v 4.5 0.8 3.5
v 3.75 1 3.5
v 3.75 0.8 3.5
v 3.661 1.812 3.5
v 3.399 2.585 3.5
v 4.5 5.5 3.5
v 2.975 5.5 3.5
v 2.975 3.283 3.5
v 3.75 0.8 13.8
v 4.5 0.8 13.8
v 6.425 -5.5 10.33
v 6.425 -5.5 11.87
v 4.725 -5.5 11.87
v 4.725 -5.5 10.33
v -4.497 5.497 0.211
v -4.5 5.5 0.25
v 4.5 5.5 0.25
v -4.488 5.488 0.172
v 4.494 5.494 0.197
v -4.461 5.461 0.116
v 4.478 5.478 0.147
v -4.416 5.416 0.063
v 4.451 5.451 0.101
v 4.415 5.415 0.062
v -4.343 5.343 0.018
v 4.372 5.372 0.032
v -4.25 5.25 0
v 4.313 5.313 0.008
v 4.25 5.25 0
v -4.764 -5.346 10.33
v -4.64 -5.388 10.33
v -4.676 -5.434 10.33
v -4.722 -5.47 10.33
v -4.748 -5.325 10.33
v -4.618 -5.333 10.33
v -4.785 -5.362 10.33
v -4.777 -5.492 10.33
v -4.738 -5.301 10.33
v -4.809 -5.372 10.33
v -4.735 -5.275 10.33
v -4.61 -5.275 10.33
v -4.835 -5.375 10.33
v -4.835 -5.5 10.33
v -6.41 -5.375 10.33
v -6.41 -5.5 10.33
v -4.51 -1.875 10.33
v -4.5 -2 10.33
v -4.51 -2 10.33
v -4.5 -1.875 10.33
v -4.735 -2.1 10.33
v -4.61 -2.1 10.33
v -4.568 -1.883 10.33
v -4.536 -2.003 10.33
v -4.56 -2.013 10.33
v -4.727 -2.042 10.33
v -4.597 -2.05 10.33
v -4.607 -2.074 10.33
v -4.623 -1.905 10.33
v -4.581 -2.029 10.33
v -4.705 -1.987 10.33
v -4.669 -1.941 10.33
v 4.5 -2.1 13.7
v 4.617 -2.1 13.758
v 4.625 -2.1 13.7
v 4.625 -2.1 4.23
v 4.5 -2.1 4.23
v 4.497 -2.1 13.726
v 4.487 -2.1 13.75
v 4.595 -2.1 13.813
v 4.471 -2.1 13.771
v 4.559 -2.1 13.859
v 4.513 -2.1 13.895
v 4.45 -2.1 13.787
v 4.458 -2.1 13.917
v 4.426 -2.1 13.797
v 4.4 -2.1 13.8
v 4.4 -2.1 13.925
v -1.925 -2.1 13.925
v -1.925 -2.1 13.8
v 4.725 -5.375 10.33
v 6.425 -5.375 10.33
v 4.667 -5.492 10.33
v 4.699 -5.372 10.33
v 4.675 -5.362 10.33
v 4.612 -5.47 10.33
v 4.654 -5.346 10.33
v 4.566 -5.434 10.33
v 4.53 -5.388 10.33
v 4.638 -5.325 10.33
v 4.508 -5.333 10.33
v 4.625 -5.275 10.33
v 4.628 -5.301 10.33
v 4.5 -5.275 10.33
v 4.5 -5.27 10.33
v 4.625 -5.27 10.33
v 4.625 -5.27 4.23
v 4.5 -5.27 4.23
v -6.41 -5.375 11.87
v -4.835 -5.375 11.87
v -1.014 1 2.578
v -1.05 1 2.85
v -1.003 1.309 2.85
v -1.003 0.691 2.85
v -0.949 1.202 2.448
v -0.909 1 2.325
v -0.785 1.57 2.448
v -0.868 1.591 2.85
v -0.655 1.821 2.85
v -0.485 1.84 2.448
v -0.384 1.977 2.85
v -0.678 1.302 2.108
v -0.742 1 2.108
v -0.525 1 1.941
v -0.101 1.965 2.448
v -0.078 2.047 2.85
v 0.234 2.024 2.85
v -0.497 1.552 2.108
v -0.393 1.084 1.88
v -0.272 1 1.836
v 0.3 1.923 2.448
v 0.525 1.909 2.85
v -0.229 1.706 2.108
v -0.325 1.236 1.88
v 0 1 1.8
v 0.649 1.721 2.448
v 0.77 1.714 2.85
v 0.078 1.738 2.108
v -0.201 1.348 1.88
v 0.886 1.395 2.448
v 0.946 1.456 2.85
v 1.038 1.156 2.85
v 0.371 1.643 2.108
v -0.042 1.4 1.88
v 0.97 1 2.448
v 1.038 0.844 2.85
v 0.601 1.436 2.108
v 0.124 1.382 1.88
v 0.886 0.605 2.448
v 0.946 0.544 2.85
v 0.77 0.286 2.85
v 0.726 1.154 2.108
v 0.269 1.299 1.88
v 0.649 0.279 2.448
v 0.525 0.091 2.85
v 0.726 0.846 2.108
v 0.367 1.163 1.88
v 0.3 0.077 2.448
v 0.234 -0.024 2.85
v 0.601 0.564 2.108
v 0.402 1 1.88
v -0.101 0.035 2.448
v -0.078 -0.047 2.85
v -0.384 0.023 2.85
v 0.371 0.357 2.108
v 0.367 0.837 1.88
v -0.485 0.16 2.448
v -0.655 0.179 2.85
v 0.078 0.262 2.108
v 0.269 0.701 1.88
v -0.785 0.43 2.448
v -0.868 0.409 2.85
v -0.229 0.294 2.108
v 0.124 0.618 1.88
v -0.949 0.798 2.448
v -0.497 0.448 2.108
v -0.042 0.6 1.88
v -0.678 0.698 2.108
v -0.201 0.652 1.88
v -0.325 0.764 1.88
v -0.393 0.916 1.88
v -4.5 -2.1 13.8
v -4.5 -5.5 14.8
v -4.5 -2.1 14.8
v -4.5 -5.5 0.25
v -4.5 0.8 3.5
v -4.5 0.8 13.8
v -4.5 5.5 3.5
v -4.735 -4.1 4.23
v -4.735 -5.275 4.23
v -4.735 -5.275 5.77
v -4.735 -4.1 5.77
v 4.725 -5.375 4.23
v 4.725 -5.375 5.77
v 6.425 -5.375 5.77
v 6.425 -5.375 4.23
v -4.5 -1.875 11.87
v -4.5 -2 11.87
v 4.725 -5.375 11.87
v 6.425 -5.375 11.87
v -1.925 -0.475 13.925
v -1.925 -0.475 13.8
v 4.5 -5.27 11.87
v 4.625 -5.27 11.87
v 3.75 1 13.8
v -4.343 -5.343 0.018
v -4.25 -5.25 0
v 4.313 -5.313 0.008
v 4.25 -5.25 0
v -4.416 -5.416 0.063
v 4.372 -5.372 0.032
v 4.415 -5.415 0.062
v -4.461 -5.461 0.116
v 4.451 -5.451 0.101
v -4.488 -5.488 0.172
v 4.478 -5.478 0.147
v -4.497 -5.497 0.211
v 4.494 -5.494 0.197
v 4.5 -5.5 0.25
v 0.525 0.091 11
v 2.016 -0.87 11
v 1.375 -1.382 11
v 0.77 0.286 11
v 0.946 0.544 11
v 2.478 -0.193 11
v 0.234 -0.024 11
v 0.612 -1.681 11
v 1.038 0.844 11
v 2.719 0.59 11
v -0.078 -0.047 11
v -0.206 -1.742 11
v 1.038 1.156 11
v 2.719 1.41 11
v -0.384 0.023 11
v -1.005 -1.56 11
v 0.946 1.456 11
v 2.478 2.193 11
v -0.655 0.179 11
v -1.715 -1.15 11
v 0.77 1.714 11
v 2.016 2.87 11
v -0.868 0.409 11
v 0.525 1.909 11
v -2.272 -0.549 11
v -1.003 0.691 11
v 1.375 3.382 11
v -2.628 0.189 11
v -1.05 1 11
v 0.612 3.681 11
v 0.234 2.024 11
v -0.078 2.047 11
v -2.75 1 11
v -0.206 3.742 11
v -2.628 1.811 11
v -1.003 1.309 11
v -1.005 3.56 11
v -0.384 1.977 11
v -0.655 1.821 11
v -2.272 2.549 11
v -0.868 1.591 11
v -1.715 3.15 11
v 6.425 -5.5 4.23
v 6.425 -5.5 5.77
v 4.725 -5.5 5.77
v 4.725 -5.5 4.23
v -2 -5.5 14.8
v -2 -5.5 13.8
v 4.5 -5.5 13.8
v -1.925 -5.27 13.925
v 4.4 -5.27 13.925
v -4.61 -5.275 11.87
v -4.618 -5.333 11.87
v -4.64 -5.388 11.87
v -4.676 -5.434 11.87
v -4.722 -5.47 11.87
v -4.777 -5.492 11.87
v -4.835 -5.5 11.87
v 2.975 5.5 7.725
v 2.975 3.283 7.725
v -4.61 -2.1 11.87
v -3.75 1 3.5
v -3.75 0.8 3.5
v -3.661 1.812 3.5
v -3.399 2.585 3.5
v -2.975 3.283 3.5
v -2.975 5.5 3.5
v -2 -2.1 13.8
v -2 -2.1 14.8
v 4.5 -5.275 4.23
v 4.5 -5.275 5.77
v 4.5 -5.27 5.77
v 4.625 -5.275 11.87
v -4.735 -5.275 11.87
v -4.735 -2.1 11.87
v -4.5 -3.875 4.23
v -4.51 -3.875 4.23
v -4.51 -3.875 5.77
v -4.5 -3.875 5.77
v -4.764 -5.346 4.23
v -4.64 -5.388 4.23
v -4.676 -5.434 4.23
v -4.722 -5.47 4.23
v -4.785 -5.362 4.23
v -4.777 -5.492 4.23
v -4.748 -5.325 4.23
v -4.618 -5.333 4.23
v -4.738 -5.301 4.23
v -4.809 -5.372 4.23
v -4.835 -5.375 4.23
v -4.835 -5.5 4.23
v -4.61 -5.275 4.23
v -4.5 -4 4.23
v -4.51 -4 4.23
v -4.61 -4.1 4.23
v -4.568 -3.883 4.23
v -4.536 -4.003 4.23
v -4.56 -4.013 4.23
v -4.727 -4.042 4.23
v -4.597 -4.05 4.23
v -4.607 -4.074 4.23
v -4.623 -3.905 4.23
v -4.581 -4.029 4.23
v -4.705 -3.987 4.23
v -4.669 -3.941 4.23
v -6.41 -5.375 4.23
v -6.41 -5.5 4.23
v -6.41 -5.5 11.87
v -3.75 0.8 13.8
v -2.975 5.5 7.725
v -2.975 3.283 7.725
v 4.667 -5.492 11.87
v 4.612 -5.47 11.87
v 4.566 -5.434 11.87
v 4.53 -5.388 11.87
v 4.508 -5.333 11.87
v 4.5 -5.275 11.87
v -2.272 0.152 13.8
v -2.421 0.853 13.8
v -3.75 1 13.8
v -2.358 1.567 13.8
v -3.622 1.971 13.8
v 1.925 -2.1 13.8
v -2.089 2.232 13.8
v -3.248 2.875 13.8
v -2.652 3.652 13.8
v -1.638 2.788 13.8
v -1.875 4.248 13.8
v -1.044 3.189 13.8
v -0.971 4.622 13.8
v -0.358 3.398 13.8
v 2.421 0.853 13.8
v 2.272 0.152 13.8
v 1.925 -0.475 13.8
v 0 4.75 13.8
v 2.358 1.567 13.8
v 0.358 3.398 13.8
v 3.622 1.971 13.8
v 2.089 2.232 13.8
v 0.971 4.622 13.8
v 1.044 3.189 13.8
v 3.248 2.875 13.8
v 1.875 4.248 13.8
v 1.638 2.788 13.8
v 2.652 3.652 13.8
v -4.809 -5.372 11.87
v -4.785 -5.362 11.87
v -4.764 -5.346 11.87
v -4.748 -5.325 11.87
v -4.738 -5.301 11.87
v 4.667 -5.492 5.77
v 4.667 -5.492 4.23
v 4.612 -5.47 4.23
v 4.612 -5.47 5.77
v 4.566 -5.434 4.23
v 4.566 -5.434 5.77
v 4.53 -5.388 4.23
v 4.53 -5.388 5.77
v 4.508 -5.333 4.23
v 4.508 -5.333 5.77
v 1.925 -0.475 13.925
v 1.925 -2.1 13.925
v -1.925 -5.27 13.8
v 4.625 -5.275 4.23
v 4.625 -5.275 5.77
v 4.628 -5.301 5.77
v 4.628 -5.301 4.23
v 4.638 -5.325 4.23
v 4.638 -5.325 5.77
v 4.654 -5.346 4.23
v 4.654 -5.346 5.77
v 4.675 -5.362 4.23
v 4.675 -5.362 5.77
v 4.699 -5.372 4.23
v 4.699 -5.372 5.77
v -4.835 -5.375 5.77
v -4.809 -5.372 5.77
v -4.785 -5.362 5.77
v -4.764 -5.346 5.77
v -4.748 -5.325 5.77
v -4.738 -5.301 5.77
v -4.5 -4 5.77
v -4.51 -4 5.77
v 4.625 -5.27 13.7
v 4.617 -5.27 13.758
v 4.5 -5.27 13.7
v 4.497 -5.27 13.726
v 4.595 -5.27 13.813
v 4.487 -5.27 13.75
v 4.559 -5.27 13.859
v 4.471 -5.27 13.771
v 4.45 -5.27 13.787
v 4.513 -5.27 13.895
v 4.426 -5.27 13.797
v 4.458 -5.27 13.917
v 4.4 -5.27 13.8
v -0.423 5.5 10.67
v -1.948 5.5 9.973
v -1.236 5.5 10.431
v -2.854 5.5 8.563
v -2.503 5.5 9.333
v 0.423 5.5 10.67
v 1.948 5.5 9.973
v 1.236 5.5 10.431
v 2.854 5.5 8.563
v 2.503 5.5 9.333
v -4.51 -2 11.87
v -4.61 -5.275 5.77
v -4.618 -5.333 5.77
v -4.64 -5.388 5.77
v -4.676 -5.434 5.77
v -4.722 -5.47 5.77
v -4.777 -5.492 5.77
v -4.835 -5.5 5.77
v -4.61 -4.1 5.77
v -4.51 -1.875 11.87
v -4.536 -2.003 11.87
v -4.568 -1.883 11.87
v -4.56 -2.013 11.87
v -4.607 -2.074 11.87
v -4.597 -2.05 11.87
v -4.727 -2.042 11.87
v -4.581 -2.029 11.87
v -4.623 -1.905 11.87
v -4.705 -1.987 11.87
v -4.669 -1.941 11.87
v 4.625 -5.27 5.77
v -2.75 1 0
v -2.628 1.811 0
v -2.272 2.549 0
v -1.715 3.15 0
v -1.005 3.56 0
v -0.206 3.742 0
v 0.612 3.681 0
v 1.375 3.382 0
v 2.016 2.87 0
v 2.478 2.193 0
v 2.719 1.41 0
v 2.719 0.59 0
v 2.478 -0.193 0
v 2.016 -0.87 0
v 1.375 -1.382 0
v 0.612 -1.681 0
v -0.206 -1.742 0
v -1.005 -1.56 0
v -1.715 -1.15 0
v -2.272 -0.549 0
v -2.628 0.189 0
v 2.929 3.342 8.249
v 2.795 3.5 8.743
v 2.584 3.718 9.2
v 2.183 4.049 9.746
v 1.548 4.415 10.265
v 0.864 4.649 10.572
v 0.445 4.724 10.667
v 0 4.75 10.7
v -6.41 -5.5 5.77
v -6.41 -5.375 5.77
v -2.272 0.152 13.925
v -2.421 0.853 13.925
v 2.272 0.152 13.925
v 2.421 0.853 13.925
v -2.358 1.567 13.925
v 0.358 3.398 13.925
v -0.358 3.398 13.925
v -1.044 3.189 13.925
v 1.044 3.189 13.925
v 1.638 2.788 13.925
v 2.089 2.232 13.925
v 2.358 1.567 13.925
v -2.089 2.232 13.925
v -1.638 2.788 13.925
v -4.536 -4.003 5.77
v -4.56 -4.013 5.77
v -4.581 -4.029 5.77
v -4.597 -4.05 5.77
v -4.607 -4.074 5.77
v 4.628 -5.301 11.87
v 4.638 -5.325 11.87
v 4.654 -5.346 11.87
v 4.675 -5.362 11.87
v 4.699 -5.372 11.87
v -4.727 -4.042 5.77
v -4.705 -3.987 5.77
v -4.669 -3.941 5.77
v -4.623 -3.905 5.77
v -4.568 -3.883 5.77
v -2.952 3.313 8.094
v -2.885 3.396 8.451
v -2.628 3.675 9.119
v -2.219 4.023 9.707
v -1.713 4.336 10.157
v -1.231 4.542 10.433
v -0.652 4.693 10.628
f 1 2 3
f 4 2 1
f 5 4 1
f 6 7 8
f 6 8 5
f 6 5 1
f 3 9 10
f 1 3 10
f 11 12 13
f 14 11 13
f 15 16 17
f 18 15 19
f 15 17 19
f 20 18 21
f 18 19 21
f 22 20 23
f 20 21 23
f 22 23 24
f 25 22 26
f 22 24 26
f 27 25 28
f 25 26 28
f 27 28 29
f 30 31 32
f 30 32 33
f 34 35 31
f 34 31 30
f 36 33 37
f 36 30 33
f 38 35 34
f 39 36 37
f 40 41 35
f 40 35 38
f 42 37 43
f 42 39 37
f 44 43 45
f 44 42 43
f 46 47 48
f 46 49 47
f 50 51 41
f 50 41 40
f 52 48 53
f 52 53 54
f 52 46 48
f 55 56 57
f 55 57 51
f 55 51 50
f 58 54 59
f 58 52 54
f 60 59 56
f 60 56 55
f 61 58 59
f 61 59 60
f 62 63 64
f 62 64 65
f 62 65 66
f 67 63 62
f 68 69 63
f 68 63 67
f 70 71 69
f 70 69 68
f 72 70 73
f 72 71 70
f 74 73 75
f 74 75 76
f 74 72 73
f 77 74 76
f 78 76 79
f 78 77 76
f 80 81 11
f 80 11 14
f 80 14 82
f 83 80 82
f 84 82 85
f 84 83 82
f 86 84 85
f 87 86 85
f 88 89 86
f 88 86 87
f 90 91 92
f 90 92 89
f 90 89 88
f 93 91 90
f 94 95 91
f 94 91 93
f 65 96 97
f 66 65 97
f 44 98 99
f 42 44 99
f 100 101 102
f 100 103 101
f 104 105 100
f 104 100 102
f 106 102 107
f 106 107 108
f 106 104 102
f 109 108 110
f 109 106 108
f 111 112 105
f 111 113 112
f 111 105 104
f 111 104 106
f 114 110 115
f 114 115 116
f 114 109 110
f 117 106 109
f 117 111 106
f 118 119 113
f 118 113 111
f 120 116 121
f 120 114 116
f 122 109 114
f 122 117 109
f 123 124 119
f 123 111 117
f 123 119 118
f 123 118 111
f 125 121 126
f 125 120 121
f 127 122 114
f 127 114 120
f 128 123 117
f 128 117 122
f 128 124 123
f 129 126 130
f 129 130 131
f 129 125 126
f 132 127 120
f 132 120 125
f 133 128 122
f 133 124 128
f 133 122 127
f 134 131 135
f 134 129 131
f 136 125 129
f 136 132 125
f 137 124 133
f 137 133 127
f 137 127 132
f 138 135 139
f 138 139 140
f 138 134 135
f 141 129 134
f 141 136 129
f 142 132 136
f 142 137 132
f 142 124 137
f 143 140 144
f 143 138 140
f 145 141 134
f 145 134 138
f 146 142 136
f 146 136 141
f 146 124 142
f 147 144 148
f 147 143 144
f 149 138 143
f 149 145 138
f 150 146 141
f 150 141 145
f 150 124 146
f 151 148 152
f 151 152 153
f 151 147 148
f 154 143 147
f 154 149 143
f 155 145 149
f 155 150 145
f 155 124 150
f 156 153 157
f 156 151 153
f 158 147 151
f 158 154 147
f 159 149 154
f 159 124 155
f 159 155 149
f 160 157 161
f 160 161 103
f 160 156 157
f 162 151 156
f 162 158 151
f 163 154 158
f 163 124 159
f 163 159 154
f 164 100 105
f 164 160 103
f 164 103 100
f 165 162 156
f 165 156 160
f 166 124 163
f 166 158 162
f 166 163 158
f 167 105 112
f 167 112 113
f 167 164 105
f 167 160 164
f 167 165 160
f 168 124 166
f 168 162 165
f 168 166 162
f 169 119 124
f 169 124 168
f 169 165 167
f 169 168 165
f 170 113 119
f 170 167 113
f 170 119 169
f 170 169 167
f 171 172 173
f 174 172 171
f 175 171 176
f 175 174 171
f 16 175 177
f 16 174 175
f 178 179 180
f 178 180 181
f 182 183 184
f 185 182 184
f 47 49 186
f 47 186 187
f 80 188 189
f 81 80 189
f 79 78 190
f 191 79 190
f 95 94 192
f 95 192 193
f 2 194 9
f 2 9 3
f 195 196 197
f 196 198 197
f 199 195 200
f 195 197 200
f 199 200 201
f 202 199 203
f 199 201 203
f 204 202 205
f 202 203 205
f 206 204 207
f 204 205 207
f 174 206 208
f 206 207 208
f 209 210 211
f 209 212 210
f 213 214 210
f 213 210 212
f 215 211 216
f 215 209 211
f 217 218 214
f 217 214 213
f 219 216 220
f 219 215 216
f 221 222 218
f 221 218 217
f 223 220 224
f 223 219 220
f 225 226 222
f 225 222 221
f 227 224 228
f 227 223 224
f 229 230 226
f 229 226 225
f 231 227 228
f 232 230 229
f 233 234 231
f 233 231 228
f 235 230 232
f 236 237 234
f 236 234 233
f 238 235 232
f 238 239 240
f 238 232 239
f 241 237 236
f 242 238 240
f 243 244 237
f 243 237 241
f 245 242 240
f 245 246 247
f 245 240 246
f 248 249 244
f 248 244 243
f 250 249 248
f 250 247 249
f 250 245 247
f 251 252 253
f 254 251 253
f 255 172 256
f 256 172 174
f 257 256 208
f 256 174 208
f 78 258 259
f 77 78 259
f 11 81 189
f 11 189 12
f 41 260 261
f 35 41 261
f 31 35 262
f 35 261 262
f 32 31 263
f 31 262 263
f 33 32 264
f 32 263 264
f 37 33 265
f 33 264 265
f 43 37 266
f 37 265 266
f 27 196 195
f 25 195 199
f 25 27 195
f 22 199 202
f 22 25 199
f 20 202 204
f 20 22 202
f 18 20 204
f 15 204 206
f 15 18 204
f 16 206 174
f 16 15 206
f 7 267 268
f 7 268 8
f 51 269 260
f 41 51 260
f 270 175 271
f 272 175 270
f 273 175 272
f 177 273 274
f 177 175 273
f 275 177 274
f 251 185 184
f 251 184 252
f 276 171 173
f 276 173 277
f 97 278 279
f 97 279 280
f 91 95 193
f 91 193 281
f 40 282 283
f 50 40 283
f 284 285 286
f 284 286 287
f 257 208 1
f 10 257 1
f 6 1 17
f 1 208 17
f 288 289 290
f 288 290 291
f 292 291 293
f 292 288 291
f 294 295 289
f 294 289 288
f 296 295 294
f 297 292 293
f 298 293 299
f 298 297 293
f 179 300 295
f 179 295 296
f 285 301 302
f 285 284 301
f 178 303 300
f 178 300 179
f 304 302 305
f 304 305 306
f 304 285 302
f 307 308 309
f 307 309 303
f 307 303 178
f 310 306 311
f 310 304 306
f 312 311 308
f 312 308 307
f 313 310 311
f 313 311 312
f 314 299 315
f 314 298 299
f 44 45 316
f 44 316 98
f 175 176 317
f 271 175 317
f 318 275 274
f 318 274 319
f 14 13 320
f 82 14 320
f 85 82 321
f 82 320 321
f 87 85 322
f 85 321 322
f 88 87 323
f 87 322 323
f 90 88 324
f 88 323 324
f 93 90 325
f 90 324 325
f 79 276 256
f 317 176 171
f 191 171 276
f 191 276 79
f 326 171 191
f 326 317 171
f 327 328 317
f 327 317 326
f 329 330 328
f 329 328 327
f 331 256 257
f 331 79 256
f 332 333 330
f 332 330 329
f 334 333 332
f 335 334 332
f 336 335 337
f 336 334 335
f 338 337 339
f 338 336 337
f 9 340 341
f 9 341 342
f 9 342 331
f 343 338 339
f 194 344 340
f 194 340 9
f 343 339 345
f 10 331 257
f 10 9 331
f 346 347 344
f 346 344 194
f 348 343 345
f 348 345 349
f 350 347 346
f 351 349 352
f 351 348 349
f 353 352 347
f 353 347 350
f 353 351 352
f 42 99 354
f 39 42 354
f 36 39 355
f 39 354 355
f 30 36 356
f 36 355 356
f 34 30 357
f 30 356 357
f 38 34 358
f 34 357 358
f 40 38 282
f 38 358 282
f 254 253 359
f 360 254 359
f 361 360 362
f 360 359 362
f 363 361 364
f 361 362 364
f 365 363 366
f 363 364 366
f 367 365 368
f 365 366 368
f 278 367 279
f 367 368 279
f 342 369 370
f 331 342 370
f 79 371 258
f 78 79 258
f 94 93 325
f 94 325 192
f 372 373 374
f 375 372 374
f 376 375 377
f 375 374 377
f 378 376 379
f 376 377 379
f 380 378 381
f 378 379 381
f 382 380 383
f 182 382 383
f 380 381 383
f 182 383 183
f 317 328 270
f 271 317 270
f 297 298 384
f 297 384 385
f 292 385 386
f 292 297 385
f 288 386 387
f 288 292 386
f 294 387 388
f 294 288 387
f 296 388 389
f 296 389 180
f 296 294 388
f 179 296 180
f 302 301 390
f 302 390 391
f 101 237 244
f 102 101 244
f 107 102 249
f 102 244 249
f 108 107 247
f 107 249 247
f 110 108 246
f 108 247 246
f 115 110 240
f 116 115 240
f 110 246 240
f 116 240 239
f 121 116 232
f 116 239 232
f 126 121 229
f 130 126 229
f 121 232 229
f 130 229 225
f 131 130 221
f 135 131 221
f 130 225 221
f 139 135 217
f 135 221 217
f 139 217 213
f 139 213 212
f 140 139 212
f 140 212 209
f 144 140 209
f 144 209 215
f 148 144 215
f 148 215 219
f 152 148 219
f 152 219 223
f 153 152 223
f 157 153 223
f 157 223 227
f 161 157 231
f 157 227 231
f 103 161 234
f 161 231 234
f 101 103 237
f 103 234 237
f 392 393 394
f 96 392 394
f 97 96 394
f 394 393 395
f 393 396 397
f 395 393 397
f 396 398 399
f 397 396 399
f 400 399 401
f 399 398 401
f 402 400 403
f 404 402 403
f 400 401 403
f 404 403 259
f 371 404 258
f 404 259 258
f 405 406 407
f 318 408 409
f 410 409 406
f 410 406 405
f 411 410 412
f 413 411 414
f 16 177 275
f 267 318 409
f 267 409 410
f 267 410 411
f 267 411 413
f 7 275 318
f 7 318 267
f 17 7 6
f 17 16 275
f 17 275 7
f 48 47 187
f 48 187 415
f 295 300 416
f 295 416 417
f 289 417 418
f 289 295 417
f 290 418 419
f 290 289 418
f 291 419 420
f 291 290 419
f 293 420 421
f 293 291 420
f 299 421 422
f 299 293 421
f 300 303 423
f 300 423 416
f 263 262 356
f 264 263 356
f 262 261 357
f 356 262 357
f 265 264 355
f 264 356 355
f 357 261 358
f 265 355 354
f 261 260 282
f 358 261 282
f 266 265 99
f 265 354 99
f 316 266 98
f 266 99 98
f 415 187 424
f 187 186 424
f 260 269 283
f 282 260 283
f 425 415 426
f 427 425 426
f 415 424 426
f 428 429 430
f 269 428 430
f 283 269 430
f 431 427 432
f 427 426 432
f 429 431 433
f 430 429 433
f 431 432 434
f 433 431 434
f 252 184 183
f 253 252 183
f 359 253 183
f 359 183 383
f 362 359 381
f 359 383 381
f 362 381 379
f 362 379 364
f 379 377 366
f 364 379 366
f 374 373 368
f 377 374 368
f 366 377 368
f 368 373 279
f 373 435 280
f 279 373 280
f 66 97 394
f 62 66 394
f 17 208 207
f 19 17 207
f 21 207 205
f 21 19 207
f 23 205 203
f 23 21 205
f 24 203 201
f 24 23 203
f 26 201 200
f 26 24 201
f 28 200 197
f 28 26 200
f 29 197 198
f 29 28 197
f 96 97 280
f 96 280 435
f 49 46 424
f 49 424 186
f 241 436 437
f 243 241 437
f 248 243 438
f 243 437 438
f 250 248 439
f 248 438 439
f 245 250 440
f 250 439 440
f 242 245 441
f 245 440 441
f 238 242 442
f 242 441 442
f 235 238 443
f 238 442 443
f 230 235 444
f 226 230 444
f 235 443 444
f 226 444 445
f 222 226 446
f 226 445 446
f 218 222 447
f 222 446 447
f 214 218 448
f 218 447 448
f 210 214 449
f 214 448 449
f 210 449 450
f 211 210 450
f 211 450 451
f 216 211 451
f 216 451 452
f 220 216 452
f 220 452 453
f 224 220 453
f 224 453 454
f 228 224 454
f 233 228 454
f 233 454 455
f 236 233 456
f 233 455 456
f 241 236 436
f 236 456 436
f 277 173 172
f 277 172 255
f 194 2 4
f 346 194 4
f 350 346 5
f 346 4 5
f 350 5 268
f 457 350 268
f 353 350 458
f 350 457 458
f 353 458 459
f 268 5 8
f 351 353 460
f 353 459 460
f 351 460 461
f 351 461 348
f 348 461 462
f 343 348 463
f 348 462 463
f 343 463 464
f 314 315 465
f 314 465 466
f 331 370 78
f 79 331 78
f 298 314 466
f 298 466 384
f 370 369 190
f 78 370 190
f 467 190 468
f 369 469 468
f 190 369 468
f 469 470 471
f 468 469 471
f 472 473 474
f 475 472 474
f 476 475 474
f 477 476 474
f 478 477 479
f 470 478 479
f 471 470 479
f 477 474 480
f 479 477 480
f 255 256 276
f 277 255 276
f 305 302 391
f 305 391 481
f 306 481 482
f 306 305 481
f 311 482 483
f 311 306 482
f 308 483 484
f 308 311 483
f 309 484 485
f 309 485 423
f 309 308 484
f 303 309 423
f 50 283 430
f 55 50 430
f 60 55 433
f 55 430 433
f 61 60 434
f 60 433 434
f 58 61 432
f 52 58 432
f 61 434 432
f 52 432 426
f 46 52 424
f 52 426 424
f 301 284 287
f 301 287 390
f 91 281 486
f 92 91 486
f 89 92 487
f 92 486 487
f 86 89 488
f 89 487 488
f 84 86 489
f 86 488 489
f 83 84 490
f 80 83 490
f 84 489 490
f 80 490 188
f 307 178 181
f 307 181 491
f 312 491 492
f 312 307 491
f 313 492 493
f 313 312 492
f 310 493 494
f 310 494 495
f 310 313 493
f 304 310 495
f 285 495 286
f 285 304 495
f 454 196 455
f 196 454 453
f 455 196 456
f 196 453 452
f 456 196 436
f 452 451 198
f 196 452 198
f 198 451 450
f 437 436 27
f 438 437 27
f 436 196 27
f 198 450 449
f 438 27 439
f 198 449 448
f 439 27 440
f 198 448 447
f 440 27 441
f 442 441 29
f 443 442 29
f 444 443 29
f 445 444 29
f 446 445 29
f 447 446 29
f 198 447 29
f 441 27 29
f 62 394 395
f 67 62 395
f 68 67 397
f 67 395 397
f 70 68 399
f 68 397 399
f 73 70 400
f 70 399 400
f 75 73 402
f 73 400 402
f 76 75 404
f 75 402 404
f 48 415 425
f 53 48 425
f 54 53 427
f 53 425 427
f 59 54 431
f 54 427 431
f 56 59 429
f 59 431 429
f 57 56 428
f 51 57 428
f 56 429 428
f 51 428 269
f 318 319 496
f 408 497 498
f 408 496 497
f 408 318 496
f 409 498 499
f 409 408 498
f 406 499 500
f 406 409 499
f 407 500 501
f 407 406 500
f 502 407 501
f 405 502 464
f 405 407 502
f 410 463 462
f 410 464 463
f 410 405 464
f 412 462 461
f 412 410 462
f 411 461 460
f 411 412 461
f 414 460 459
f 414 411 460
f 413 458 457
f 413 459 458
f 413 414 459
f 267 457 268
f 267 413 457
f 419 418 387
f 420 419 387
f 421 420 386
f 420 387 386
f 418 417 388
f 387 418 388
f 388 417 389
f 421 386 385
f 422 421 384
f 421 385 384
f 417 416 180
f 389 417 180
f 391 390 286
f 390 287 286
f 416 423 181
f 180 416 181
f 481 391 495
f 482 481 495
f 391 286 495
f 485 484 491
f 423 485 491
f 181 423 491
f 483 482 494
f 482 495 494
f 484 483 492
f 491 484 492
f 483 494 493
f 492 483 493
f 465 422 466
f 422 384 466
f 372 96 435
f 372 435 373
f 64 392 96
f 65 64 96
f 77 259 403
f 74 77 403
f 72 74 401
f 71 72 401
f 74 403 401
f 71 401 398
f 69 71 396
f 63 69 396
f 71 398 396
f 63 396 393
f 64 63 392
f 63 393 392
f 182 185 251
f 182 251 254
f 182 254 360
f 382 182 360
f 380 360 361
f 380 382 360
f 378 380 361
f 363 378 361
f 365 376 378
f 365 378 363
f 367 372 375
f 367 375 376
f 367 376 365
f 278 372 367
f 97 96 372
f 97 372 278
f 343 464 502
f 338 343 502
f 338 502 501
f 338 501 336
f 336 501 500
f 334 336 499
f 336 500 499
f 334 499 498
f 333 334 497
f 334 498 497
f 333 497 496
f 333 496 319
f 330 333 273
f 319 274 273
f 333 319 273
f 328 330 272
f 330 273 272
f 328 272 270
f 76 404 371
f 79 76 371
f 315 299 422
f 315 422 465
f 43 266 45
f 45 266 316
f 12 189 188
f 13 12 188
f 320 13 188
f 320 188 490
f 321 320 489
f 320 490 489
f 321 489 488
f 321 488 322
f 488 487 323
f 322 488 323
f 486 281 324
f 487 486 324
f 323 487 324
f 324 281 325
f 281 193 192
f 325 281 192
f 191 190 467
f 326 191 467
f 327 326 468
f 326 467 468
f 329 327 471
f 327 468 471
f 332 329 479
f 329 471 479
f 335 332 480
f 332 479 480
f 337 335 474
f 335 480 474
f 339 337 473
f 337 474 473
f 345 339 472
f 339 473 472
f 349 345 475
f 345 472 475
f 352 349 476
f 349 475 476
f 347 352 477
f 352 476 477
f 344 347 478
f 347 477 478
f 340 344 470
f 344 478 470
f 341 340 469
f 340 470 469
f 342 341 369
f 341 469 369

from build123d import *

# Parameters (mm, degrees)
SKETCH1_W               = 9
SKETCH1_H               = 11
BOSS_EXTRUDE1_DEPTH     = 13.8
SKETCH2_R               = 2.75
CUT_EXTRUDE1_DEPTH      = 11
CUT_EXTRUDE2_DEPTH      = 0.75
SKETCH4_R               = 1.05
BOSS_EXTRUDE2_DEPTH     = 9.2
FILLET2_R               = 1.05
SKETCH6_W               = 0.75
SKETCH6_H               = 10.3
CUT_EXTRUDE3_DEPTH      = 3.95
FILLET3_R               = 3.75
BASE_FLANGE1_DEPTH      = 3.17
BOSS_EXTRUDE4_DEPTH     = 0.125
FILLET4_R               = 0.25
BASE_FLANGE2_DEPTH      = 0.77
BASE_FLANGE2_DEPTH_BACK = 0.77
LPATTERN1_COUNT         = 2
LPATTERN1_PITCH         = 6.1
SKETCH27_W              = 2.5
SKETCH27_H              = 3.4
BOSS_EXTRUDE5_DEPTH     = 1
BASE_FLANGE3_DEPTH      = 0.77
BASE_FLANGE3_DEPTH_BACK = 0.77
BASE_FLANGE4_DEPTH      = 0.77
BASE_FLANGE4_DEPTH_BACK = 0.77


# Sheet-metal steps are written as plain solids
with BuildPart() as part:
    # Sketch1 → Boss-Extrude1 (new body)
    with BuildSketch(Plane.XY):
        Rectangle(SKETCH1_W, SKETCH1_H)
    extrude(amount=BOSS_EXTRUDE1_DEPTH)

    # Sketch2 → Cut-Extrude1 (cut)
    with BuildSketch(Plane(origin=(0, 0, 0), x_dir=(-1, 0, 0), z_dir=(0, 0, -1))):
        with Locations((0, 1)):
            Circle(SKETCH2_R)
    extrude(amount=-CUT_EXTRUDE1_DEPTH, mode=Mode.SUBTRACT)

    # Sketch3 → Cut-Extrude2 (cut)
    with BuildSketch(Plane(origin=(0, 5.5, 0), x_dir=(1, 0, 0), z_dir=(0, 1, 0))):
        with BuildLine():
            Line((2.975, -7.725), (2.975, -3.5))
            Line((2.975, -3.5), (4.5, -3.5))
            Line((4.5, -3.5), (4.5, -13.8))
            Line((4.5, -13.8), (-4.5, -13.8))
            Line((-4.5, -13.8), (-4.5, -3.5))
            Line((-4.5, -3.5), (-2.975, -3.5))
            Line((-2.975, -3.5), (-2.975, -7.725))
            ThreePointArc((-2.975, -7.725), (0, -10.7), (2.975, -7.725))
        make_face()
    extrude(amount=-CUT_EXTRUDE2_DEPTH, mode=Mode.SUBTRACT)

    # Sketch4 → Boss-Extrude2 (add)
    with BuildSketch(Plane(origin=(0, 0, 11), x_dir=(-1, 0, 0), z_dir=(0, 0, -1))):
        with Locations((0, 1)):
            Circle(SKETCH4_R)
    extrude(amount=BOSS_EXTRUDE2_DEPTH)

    # Fillet2
    fillet2_edges = [part.edges().sort_by_distance(p)[0] for p in [
        (1.05, 1, 1.8),
    ]]
    fillet(fillet2_edges, radius=FILLET2_R)

    # Sketch6 → Cut-Extrude3 (cut)
    with BuildSketch(Plane(origin=(0, 4.75, 0), x_dir=(1, 0, 0), z_dir=(0, 1, 0))):
        with Locations((4.125, -8.65)):
            Rectangle(SKETCH6_W, SKETCH6_H)
        with Locations((-4.125, -8.65)):
            Rectangle(SKETCH6_W, SKETCH6_H)
    extrude(amount=-CUT_EXTRUDE3_DEPTH, mode=Mode.SUBTRACT)

    # Fillet3
    fillet3_edges = [part.edges().sort_by_distance(p)[0] for p in [
        (3.75, 4.75, 8.65),
        (-3.75, 4.75, 8.65),
    ]]
    fillet(fillet3_edges, radius=FILLET3_R - 0.0001)  # a hair under: the kernel refuses the full size

    # Fillet4
    fillet4_edges = [part.edges().sort_by_distance(p)[0] for p in [
        (-4.5, 0, 0),
        (0, 5.5, 0),
        (4.5, 0, 0),
        (0, -5.5, 0),
    ]]
    fillet(fillet4_edges, radius=FILLET4_R)



with BuildPart() as body_2:
    # Sketch9 → Base-Flange1 (new body)
    with BuildSketch(Plane.XZ.offset(5.27)):
        with BuildLine():
            Line((-1.925, 13.925), (4.4, 13.925))
            ThreePointArc((4.4, 13.925), (4.559099026, 13.859099026), (4.625, 13.7))
            Line((4.625, 13.7), (4.625, 4.23))
            Line((4.625, 4.23), (4.5, 4.23))
            Line((4.5, 4.23), (4.5, 13.7))
            ThreePointArc((4.5, 13.7), (4.470710678, 13.770710678), (4.4, 13.8))
            Line((4.4, 13.8), (-1.925, 13.8))
            Line((-1.925, 13.8), (-1.925, 13.925))
        make_face()
    extrude(amount=-BASE_FLANGE1_DEPTH)


with BuildPart() as body_3:
    # Sketch14 → Boss-Extrude4 (new body)
    with BuildSketch(Plane(origin=(-10.664949063, -1.262516382, 13.925), x_dir=(1, 0, 0), z_dir=(0, 0, 1))):
        with BuildLine():
            Line((8.739949063, -0.837483618), (8.739949063, 0.787728261))
            ThreePointArc((8.739949063, 0.787728261), (10.664949063, 4.687516382), (12.589949063, 0.787728261))
            Line((12.589949063, 0.787728261), (12.589949063, -0.837483618))
            Line((12.589949063, -0.837483618), (8.739949063, -0.837483618))
        make_face()
    extrude(amount=-BOSS_EXTRUDE4_DEPTH)


with BuildPart() as body_4:
    # Sketch20 → Base-Flange2 (new, two sides: drawn at the far end of the back side and taken through both)
    with BuildSketch(Plane(origin=(0, 0, 11.1), x_dir=(-1, 0, 0), z_dir=(0, 0, -1)).offset(-BASE_FLANGE2_DEPTH_BACK)):
        with BuildLine():
            Line((-4.625, -5.27), (-4.625, -5.275))
            ThreePointArc((-4.625, -5.275), (-4.654289322, -5.345710678), (-4.725, -5.375))
            Line((-4.725, -5.375), (-6.425, -5.375))
            Line((-6.425, -5.375), (-6.425, -5.5))
            Line((-6.425, -5.5), (-4.725, -5.5))
            ThreePointArc((-4.725, -5.5), (-4.565900974, -5.434099026), (-4.5, -5.275))
            Line((-4.5, -5.275), (-4.5, -5.27))
            Line((-4.5, -5.27), (-4.625, -5.27))
        make_face()
    extrude(amount=BASE_FLANGE2_DEPTH + BASE_FLANGE2_DEPTH_BACK)


with BuildPart() as lpattern1_1:
    # LPattern1: pattern copy
    add(body_4.part.moved(Location(Vector(0, 0, -1) * (1 * LPATTERN1_PITCH))))


with BuildPart() as part_1:
    add(part.part)

    add(body_3.part)  # Boss-Extrude5 merges body 3
    # Sketch27 → Boss-Extrude5 (add)
    with BuildSketch(Plane.XY.offset(13.8)):
        with Locations((-3.25, -3.8)):
            Rectangle(SKETCH27_W, SKETCH27_H)
    extrude(amount=BOSS_EXTRUDE5_DEPTH)


with BuildPart() as body_5:
    # Sketch28 → Base-Flange3 (new, two sides: drawn at the far end of the back side and taken through both)
    with BuildSketch(Plane(origin=(0, 0, 11.1), x_dir=(-1, 0, 0), z_dir=(0, 0, -1)).offset(-BASE_FLANGE3_DEPTH_BACK)):
        with BuildLine():
            Line((4.5, -2), (4.51, -2))
            ThreePointArc((4.51, -2), (4.580710678, -2.029289322), (4.61, -2.1))
            Line((4.61, -2.1), (4.61, -5.275))
            ThreePointArc((4.61, -5.275), (4.675900974, -5.434099026), (4.835, -5.5))
            Line((4.835, -5.5), (6.41, -5.5))
            Line((6.41, -5.5), (6.41, -5.375))
            Line((6.41, -5.375), (4.835, -5.375))
            ThreePointArc((4.835, -5.375), (4.764289322, -5.345710678), (4.735, -5.275))
            Line((4.735, -5.275), (4.735, -2.1))
            ThreePointArc((4.735, -2.1), (4.669099026, -1.940900974), (4.51, -1.875))
            Line((4.51, -1.875), (4.5, -1.875))
            Line((4.5, -1.875), (4.5, -2))
        make_face()
    extrude(amount=BASE_FLANGE3_DEPTH + BASE_FLANGE3_DEPTH_BACK)


with BuildPart() as body_6:
    # Sketch31 → Base-Flange4 (new, two sides: drawn at the far end of the back side and taken through both)
    with BuildSketch(Plane.XY.offset(5).offset(-BASE_FLANGE4_DEPTH_BACK)):
        with BuildLine():
            Line((-4.5, -4), (-4.51, -4))
            ThreePointArc((-4.51, -4), (-4.580710678, -4.029289322), (-4.61, -4.1))
            Line((-4.61, -4.1), (-4.61, -5.275))
            ThreePointArc((-4.61, -5.275), (-4.675900974, -5.434099026), (-4.835, -5.5))
            Line((-4.835, -5.5), (-6.41, -5.5))
            Line((-6.41, -5.5), (-6.41, -5.375))
            Line((-6.41, -5.375), (-4.835, -5.375))
            ThreePointArc((-4.835, -5.375), (-4.764289322, -5.345710678), (-4.735, -5.275))
            Line((-4.735, -5.275), (-4.735, -4.1))
            ThreePointArc((-4.735, -4.1), (-4.669099026, -3.940900974), (-4.51, -3.875))
            Line((-4.51, -3.875), (-4.5, -3.875))
            Line((-4.5, -3.875), (-4.5, -4))
        make_face()
    extrude(amount=BASE_FLANGE4_DEPTH + BASE_FLANGE4_DEPTH_BACK)


solid = Compound([body_2.part, body_4.part, lpattern1_1.part, part_1.part, body_5.part, body_6.part])
